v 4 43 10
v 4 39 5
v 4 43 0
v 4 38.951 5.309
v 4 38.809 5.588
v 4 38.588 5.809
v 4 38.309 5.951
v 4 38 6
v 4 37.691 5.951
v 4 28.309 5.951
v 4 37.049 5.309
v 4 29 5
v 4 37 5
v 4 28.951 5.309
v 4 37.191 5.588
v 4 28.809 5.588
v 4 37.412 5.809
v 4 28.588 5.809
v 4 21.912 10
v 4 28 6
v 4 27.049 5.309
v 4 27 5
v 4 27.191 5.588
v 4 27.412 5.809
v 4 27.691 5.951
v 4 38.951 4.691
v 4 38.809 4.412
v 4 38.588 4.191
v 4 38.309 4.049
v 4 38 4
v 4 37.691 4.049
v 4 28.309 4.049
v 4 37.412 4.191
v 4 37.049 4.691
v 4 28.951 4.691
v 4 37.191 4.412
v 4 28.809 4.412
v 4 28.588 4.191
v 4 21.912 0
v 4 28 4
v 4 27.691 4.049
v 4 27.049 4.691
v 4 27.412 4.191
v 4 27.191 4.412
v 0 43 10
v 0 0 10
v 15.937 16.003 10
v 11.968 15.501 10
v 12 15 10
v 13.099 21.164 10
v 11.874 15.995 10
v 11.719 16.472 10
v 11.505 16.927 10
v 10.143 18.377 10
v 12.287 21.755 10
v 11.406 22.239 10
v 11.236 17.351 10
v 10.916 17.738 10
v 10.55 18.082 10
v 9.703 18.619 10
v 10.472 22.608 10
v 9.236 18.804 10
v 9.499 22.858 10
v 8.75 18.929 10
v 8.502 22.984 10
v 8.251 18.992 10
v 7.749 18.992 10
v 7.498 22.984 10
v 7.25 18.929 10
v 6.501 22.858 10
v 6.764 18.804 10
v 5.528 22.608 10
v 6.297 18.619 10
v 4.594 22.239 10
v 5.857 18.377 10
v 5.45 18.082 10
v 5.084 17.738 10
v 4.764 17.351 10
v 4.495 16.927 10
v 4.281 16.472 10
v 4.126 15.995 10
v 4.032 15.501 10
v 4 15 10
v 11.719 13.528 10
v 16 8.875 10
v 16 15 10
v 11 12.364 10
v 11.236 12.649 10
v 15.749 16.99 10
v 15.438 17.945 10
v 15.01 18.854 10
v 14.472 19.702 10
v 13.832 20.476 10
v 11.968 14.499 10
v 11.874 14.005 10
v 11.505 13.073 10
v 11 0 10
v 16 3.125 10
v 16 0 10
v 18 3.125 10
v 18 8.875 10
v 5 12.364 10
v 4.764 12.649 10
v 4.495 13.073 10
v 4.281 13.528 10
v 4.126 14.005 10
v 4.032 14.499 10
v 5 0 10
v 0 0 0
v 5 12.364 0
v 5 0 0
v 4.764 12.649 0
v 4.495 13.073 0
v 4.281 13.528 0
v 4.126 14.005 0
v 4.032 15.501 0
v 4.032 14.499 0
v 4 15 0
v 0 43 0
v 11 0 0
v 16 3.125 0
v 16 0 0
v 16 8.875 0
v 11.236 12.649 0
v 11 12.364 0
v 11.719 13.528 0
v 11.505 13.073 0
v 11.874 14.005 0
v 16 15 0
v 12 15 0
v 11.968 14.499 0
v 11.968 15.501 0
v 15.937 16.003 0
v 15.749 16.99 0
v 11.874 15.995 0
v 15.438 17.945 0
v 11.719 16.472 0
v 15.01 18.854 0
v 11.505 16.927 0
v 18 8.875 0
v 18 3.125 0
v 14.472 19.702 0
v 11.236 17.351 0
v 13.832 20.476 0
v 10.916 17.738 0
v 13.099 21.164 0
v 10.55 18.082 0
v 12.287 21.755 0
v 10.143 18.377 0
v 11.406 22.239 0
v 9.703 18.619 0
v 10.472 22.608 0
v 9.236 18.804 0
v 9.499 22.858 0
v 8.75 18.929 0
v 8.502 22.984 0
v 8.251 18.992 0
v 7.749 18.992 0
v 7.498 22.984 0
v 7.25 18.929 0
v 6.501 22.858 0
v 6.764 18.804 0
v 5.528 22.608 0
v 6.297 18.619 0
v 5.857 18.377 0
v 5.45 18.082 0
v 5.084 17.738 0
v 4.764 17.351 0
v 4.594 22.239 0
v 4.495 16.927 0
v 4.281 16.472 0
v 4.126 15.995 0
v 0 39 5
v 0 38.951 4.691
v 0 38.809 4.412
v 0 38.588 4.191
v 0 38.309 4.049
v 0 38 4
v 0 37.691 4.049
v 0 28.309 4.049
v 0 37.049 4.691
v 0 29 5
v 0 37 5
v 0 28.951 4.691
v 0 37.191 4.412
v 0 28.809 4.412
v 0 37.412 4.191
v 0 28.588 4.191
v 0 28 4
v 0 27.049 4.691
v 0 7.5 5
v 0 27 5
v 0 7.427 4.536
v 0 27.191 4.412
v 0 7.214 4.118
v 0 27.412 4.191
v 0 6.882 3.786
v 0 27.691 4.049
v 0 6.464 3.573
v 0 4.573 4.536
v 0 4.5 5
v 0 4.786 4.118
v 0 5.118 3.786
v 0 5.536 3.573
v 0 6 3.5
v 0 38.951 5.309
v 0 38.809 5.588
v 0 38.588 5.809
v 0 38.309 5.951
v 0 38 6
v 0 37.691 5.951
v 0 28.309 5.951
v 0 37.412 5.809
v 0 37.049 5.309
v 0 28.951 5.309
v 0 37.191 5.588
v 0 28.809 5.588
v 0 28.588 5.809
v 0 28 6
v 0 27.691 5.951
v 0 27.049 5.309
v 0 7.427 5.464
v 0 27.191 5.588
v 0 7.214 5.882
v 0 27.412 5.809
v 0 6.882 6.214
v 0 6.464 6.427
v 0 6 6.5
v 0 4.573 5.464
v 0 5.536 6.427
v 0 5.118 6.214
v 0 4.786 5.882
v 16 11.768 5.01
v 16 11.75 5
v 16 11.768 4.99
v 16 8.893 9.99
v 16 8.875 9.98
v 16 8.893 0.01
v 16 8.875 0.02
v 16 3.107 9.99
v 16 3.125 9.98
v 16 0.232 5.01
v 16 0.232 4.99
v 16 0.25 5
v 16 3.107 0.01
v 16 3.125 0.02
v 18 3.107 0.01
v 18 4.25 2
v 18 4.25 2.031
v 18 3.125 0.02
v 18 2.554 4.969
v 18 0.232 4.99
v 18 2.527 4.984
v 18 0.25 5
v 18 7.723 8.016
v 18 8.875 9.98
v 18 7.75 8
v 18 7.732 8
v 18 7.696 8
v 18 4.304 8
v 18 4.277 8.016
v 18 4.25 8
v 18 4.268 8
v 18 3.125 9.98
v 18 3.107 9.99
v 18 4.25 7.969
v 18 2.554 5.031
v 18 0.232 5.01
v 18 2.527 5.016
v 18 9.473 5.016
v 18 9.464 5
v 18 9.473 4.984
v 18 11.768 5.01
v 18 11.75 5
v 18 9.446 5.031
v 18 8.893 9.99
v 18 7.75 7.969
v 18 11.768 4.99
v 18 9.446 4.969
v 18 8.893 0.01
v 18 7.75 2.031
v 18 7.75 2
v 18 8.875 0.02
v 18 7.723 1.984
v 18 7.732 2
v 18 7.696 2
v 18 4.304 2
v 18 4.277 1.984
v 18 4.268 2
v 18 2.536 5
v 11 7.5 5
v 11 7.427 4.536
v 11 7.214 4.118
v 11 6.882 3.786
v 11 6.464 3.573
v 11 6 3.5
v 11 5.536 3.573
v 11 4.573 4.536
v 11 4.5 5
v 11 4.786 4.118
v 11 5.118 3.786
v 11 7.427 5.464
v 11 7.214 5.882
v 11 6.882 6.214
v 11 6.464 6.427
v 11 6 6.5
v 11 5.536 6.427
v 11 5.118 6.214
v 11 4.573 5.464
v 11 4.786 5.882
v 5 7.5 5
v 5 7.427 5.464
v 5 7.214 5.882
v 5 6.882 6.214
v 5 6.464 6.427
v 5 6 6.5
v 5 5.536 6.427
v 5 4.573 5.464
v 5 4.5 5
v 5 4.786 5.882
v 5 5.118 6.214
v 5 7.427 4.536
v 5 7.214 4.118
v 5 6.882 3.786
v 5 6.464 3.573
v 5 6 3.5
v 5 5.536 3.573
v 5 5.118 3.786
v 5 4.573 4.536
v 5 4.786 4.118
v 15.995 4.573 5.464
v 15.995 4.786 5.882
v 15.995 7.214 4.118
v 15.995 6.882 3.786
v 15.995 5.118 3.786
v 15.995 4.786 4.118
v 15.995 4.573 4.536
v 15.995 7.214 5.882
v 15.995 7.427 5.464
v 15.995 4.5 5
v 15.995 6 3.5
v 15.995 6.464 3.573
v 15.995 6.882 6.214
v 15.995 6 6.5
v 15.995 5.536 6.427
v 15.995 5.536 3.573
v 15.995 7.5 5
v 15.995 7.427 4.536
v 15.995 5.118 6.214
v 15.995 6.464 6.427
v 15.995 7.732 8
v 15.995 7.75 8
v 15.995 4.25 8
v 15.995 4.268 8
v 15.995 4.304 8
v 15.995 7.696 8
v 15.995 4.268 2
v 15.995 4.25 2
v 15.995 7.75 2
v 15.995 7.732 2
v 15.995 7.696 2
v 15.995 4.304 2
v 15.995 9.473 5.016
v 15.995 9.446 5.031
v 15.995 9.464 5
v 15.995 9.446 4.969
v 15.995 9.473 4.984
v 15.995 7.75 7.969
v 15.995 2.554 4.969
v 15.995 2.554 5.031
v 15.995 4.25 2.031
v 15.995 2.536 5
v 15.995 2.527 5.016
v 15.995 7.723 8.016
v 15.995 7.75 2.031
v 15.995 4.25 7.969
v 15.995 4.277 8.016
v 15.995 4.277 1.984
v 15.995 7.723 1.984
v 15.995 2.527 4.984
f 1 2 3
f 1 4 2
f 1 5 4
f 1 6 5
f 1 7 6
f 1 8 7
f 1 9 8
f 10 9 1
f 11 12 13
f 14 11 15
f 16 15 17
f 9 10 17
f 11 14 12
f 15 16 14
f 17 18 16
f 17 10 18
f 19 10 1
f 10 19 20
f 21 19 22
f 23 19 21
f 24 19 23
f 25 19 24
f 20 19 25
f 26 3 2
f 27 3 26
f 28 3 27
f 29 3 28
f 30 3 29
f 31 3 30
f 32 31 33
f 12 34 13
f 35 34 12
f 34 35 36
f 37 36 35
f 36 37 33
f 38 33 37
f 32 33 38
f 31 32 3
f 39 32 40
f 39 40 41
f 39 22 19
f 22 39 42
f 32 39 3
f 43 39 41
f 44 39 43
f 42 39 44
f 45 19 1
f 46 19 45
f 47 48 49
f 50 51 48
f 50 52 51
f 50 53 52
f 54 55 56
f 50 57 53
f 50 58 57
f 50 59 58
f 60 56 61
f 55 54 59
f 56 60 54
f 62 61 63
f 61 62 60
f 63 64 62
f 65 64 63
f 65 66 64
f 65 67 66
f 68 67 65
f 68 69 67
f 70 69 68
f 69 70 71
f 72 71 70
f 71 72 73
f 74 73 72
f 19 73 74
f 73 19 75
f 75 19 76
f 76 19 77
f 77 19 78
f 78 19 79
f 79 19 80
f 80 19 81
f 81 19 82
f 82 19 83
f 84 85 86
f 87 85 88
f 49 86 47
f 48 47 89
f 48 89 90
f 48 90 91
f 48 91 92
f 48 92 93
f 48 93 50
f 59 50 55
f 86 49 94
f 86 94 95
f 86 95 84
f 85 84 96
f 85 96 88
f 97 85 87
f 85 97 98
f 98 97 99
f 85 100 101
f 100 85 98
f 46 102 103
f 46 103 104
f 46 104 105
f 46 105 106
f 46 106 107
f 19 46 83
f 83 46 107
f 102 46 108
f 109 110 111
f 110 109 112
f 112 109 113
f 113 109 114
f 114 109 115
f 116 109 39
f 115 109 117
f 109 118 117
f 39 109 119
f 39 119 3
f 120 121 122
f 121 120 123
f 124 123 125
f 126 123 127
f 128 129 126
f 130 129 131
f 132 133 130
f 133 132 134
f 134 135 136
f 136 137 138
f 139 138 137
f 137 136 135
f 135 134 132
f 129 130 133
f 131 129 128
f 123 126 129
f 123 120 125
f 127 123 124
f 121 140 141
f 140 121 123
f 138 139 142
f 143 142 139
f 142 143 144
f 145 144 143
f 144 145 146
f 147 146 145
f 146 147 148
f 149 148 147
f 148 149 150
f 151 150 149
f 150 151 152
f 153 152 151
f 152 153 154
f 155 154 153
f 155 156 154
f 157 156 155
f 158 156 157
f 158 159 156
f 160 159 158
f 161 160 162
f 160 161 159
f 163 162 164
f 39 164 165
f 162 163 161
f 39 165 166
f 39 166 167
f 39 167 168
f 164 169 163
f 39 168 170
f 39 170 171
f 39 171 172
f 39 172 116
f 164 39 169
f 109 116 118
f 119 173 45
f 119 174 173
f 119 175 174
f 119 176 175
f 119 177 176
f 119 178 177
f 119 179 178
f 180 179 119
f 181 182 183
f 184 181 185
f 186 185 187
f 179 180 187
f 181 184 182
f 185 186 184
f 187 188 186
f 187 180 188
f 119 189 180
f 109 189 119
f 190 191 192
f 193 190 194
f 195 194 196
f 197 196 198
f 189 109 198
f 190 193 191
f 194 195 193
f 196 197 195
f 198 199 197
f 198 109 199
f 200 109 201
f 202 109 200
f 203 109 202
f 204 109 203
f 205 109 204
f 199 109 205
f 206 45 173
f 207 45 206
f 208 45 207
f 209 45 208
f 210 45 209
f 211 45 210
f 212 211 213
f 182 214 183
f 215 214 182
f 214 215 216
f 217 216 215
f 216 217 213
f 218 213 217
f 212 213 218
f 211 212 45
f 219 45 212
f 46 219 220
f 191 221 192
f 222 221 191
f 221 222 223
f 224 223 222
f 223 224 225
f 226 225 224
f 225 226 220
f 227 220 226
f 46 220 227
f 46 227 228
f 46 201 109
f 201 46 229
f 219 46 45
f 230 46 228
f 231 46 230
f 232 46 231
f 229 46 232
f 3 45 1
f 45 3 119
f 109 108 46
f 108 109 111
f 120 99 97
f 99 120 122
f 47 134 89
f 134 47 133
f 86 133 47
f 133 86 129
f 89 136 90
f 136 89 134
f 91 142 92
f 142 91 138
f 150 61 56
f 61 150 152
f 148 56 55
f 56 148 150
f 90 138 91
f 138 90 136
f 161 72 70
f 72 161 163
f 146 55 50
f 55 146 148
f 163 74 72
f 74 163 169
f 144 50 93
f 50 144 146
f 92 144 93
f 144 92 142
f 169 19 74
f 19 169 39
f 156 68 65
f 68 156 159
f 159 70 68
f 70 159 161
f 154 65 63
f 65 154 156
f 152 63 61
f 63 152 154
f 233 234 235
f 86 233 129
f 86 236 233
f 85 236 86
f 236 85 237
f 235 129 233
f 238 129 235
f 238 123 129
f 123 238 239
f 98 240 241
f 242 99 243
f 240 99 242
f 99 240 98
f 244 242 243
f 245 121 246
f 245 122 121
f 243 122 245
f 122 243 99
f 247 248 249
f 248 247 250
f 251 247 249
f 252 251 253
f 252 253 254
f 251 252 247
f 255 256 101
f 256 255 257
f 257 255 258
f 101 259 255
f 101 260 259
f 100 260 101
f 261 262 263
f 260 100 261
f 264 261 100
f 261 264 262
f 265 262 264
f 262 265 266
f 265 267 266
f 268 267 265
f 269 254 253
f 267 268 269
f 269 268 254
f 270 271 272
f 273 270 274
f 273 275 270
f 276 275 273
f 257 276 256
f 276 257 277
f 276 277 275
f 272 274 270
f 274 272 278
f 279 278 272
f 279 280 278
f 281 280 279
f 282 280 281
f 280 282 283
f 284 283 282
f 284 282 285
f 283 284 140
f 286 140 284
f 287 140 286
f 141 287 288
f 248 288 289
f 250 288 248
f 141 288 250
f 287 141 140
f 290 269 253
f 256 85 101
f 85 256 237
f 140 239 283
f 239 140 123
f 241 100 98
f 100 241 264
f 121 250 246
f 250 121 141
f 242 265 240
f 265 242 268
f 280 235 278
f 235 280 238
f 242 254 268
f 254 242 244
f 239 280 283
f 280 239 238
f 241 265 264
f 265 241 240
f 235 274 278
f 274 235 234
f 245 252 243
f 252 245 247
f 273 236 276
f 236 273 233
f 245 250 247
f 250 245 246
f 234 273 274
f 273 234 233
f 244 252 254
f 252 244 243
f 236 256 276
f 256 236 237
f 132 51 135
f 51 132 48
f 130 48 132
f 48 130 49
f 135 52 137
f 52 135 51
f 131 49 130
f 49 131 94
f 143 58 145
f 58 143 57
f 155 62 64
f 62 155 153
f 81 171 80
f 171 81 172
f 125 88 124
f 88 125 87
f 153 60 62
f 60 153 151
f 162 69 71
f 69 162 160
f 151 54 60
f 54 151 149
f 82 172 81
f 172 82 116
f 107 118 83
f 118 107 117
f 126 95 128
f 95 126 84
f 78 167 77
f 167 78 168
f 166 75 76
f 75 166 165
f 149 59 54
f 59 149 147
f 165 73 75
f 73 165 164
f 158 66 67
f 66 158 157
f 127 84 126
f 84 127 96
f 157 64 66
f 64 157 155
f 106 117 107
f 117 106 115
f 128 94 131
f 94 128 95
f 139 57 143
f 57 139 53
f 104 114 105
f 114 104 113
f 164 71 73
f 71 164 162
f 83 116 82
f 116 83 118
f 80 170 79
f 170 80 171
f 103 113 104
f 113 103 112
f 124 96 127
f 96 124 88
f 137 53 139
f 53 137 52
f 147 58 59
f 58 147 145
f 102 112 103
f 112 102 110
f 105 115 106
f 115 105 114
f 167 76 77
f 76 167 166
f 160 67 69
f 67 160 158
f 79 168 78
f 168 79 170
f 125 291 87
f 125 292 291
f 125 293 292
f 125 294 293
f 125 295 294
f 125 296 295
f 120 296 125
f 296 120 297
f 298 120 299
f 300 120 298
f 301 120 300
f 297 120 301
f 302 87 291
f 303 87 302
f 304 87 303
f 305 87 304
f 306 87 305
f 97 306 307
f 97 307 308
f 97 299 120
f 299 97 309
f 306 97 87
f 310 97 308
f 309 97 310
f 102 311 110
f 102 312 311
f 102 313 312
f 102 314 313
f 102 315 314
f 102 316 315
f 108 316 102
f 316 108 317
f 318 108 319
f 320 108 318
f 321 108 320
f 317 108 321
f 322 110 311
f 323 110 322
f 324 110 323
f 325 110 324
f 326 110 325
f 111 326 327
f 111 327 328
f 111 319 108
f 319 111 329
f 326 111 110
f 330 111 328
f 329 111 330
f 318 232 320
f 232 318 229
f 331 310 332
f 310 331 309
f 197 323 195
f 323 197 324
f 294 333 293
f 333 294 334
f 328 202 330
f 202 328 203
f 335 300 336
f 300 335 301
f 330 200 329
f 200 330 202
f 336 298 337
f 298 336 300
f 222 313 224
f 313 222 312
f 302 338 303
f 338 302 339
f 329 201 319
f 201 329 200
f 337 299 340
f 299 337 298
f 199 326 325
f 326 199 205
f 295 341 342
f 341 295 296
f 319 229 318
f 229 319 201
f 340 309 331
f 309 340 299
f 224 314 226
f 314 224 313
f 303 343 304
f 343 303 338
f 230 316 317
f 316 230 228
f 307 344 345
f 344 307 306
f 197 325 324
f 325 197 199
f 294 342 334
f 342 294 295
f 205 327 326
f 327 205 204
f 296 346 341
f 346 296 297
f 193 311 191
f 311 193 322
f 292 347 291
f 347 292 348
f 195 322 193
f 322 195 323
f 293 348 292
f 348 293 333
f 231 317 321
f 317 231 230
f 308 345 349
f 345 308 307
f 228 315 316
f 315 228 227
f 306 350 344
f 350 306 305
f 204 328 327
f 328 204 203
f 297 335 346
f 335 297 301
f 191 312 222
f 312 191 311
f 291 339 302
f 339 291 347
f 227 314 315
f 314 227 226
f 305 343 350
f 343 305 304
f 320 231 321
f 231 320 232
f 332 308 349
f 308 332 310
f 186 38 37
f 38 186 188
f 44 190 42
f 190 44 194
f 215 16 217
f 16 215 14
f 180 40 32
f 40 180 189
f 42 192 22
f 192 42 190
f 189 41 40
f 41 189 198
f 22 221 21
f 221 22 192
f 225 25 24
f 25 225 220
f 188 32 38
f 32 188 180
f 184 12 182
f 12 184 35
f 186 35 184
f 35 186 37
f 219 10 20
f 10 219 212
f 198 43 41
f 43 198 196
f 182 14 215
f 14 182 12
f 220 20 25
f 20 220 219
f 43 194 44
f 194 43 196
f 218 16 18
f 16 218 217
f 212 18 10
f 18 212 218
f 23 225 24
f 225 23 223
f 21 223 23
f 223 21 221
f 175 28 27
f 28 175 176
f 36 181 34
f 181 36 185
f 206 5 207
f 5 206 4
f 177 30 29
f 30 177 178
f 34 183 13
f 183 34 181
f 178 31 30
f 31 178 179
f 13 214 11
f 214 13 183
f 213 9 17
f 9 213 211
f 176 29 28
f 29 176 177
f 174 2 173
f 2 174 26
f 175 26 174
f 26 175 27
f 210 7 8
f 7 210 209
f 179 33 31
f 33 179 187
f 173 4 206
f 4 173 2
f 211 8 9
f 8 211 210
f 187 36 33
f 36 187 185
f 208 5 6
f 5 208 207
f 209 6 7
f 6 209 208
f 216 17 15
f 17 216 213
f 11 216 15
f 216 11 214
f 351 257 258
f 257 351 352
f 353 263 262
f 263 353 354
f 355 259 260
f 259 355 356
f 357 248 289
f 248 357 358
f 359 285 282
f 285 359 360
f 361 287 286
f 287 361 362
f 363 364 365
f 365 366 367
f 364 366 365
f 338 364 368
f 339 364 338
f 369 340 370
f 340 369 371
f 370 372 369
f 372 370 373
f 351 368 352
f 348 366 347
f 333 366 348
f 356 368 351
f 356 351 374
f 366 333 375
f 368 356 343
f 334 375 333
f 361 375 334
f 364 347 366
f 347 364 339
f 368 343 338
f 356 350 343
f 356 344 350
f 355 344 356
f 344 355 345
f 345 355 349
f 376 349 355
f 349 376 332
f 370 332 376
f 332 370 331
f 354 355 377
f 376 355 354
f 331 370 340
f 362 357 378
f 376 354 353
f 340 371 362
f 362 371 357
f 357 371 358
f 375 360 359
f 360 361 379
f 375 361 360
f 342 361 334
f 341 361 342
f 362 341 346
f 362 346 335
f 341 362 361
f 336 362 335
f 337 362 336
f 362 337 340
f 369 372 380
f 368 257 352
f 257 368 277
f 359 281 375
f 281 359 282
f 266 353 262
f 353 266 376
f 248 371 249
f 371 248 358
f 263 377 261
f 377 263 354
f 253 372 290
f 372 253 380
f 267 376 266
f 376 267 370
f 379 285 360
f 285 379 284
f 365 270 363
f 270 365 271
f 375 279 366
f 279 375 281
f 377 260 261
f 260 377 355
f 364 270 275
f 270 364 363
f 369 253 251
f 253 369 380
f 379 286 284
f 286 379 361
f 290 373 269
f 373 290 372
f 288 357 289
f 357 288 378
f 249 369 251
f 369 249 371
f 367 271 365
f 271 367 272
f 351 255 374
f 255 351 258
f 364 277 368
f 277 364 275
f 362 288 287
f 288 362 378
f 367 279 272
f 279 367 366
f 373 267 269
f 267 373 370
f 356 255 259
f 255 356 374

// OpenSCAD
// file: micro_switch.scad
include <MCAD/materials.scad>
include <MCAD/metric_fastners.scad>

module micro_switch(with_extra_parts=false, exploded=false) {
  scale([-1,1,1]) translate([-19.8, 0, 0]){
    difference() {
      color(BlackPaint) cube([19.8, 10.8, 6.4]);

      translate([5.15, 2, 0]) {
        translate([0, 0, -0.5])
          cylinder(h = 7.4, R=2.6, $fn=100);
        translate([9.5, 0, -0.5])
        cylinder(h = 7.4, R=2.6, $fn=100);
      }
    }
    translate([2.8, 10.8, 1.2])
      rotate([0,0,10])
        color(Steel) cube([17,1,4]);

    if(with_extra_parts)
      micro_switch_extras(exploded_distance=(exploded?15:0));
  }

  module micro_switch_extras(exploded_distance=0) {
    screw_size = 2.2;
    screw_length = 13;
    echo("Non-Plastic Parts, 2, Self Tapping Screw 2.2 x 13 mm for micro switch");
    translate([5.15, 2, 0]) color(Steel) {
      translate([0, 0, 0.5+6.4+exploded_distance])
        rotate([180,0,0]) csk_bolt(screw_size, screw_length);
      translate([9.5, 0, 0.5+6.4+exploded_distance])
        rotate([180,0,0]) csk_bolt(screw_size, screw_length);
    }
  }

}


micro_switch();
// main file
//Endstop Holder by NewtonrRob
//http://www.thingiverse.com/thing:30085
//http://creativecommons.org/licenses/by-sa/3.0/

include <MCAD/units.scad>
include <MCAD/materials.scad>
include <MCAD/metric_fastners.scad>
include <MCAD/nuts_and_bolts.scad>
use <micro_switch.scad>

module end_stop_holder(with_extra_parts=false, exploded=false) {
difference() {
	union() {
		cube([4,43,10]);  //4,45,10
		translate([8, 15,0]) cylinder(h = 10, r = 8, $fn = 50);
		cube([16, 15,10]);

		translate([17,6,5]) cube([2,5.75,10], center=true);
		translate([17,6,5]) rotate(a=[60,0,0]) cube([2,5.75,10], center=true);
		translate([17,6,5]) rotate(a=[120,0,0]) cube([2,5.75,10], center=true);
	}
	translate([8, 15,-epsilon]) cylinder(h = 10+2*epsilon, r = 4, $fn = 50);
	translate([5, -epsilon, -epsilon]) cube([6, 15+epsilon,10+2*epsilon]);
	translate([-10, 6, 5]) rotate(a=[0, 90, 0]) cylinder(h = 30, r = 1.5, $fn= 20);
	translate([-10, 28, 5]) rotate(a=[0, 90, 0]) cylinder(h = 30, r = 1, $fn= 20);
	translate([-10, 38, 5]) rotate(a=[0, 90, 0]) cylinder(h = 30, r = 1, $fn= 20);
	translate([17,6,5]) cube([2+epsilon,3.5,6], center=true);
	translate([17,6,5]) rotate(a=[60,0,0]) cube([2+epsilon,3.5,6], center=true);
	translate([17,6,5]) rotate(a=[120,0,0]) cube([2+epsilon,3.5,6], center=true);
}

  if(with_extra_parts) {
    end_stop_holder_extras(exploded_distance=(exploded?8:0));
  }

  module end_stop_holder_extras(exploded_distance=0) {
    echo("Non-Plastic Parts, 6, Washer M3 to attach micro switch on end_stop_holder");
    for(i = [0:2] ) {
      translate([4+i*0.3+(i+1)*0.2*exploded_distance, 28, 5]) rotate([0, 90, 0]) color(Steel) washer(3);
      translate([4+i*0.3+(i+1)*0.2*exploded_distance, 38, 5]) rotate([0, 90, 0]) color(Steel) washer(3);
    }

    echo("Non-Plastic Parts, 1, Micro Switch on end_stop_holder");
    translate([4+3*0.3+exploded_distance, 28-5.15+(10-9.5)/2, 5-2])
      rotate([90,0,90])
        micro_switch(with_extra_parts=true, exploded=(exploded_distance!=0));

    echo("Non-Plastic Parts, 1, Bolt M3 x 18 mm to attach end_stop_holder on smooth rod");
    translate([-3*exploded_distance,6,5])
      rotate([0,90,0])
        color(Steel) boltHole(size=3, length=18);

    echo("Non-Plastic Parts, 1, Nut M3 to attach end_stop_holder on smooth rod");
    translate([17+0.9*3/2+exploded_distance,6,5])
      rotate([0,-90,0])
        rotate([0,0,30]) color(Steel) flat_nut(3);
  }

}


end_stop_holder();
